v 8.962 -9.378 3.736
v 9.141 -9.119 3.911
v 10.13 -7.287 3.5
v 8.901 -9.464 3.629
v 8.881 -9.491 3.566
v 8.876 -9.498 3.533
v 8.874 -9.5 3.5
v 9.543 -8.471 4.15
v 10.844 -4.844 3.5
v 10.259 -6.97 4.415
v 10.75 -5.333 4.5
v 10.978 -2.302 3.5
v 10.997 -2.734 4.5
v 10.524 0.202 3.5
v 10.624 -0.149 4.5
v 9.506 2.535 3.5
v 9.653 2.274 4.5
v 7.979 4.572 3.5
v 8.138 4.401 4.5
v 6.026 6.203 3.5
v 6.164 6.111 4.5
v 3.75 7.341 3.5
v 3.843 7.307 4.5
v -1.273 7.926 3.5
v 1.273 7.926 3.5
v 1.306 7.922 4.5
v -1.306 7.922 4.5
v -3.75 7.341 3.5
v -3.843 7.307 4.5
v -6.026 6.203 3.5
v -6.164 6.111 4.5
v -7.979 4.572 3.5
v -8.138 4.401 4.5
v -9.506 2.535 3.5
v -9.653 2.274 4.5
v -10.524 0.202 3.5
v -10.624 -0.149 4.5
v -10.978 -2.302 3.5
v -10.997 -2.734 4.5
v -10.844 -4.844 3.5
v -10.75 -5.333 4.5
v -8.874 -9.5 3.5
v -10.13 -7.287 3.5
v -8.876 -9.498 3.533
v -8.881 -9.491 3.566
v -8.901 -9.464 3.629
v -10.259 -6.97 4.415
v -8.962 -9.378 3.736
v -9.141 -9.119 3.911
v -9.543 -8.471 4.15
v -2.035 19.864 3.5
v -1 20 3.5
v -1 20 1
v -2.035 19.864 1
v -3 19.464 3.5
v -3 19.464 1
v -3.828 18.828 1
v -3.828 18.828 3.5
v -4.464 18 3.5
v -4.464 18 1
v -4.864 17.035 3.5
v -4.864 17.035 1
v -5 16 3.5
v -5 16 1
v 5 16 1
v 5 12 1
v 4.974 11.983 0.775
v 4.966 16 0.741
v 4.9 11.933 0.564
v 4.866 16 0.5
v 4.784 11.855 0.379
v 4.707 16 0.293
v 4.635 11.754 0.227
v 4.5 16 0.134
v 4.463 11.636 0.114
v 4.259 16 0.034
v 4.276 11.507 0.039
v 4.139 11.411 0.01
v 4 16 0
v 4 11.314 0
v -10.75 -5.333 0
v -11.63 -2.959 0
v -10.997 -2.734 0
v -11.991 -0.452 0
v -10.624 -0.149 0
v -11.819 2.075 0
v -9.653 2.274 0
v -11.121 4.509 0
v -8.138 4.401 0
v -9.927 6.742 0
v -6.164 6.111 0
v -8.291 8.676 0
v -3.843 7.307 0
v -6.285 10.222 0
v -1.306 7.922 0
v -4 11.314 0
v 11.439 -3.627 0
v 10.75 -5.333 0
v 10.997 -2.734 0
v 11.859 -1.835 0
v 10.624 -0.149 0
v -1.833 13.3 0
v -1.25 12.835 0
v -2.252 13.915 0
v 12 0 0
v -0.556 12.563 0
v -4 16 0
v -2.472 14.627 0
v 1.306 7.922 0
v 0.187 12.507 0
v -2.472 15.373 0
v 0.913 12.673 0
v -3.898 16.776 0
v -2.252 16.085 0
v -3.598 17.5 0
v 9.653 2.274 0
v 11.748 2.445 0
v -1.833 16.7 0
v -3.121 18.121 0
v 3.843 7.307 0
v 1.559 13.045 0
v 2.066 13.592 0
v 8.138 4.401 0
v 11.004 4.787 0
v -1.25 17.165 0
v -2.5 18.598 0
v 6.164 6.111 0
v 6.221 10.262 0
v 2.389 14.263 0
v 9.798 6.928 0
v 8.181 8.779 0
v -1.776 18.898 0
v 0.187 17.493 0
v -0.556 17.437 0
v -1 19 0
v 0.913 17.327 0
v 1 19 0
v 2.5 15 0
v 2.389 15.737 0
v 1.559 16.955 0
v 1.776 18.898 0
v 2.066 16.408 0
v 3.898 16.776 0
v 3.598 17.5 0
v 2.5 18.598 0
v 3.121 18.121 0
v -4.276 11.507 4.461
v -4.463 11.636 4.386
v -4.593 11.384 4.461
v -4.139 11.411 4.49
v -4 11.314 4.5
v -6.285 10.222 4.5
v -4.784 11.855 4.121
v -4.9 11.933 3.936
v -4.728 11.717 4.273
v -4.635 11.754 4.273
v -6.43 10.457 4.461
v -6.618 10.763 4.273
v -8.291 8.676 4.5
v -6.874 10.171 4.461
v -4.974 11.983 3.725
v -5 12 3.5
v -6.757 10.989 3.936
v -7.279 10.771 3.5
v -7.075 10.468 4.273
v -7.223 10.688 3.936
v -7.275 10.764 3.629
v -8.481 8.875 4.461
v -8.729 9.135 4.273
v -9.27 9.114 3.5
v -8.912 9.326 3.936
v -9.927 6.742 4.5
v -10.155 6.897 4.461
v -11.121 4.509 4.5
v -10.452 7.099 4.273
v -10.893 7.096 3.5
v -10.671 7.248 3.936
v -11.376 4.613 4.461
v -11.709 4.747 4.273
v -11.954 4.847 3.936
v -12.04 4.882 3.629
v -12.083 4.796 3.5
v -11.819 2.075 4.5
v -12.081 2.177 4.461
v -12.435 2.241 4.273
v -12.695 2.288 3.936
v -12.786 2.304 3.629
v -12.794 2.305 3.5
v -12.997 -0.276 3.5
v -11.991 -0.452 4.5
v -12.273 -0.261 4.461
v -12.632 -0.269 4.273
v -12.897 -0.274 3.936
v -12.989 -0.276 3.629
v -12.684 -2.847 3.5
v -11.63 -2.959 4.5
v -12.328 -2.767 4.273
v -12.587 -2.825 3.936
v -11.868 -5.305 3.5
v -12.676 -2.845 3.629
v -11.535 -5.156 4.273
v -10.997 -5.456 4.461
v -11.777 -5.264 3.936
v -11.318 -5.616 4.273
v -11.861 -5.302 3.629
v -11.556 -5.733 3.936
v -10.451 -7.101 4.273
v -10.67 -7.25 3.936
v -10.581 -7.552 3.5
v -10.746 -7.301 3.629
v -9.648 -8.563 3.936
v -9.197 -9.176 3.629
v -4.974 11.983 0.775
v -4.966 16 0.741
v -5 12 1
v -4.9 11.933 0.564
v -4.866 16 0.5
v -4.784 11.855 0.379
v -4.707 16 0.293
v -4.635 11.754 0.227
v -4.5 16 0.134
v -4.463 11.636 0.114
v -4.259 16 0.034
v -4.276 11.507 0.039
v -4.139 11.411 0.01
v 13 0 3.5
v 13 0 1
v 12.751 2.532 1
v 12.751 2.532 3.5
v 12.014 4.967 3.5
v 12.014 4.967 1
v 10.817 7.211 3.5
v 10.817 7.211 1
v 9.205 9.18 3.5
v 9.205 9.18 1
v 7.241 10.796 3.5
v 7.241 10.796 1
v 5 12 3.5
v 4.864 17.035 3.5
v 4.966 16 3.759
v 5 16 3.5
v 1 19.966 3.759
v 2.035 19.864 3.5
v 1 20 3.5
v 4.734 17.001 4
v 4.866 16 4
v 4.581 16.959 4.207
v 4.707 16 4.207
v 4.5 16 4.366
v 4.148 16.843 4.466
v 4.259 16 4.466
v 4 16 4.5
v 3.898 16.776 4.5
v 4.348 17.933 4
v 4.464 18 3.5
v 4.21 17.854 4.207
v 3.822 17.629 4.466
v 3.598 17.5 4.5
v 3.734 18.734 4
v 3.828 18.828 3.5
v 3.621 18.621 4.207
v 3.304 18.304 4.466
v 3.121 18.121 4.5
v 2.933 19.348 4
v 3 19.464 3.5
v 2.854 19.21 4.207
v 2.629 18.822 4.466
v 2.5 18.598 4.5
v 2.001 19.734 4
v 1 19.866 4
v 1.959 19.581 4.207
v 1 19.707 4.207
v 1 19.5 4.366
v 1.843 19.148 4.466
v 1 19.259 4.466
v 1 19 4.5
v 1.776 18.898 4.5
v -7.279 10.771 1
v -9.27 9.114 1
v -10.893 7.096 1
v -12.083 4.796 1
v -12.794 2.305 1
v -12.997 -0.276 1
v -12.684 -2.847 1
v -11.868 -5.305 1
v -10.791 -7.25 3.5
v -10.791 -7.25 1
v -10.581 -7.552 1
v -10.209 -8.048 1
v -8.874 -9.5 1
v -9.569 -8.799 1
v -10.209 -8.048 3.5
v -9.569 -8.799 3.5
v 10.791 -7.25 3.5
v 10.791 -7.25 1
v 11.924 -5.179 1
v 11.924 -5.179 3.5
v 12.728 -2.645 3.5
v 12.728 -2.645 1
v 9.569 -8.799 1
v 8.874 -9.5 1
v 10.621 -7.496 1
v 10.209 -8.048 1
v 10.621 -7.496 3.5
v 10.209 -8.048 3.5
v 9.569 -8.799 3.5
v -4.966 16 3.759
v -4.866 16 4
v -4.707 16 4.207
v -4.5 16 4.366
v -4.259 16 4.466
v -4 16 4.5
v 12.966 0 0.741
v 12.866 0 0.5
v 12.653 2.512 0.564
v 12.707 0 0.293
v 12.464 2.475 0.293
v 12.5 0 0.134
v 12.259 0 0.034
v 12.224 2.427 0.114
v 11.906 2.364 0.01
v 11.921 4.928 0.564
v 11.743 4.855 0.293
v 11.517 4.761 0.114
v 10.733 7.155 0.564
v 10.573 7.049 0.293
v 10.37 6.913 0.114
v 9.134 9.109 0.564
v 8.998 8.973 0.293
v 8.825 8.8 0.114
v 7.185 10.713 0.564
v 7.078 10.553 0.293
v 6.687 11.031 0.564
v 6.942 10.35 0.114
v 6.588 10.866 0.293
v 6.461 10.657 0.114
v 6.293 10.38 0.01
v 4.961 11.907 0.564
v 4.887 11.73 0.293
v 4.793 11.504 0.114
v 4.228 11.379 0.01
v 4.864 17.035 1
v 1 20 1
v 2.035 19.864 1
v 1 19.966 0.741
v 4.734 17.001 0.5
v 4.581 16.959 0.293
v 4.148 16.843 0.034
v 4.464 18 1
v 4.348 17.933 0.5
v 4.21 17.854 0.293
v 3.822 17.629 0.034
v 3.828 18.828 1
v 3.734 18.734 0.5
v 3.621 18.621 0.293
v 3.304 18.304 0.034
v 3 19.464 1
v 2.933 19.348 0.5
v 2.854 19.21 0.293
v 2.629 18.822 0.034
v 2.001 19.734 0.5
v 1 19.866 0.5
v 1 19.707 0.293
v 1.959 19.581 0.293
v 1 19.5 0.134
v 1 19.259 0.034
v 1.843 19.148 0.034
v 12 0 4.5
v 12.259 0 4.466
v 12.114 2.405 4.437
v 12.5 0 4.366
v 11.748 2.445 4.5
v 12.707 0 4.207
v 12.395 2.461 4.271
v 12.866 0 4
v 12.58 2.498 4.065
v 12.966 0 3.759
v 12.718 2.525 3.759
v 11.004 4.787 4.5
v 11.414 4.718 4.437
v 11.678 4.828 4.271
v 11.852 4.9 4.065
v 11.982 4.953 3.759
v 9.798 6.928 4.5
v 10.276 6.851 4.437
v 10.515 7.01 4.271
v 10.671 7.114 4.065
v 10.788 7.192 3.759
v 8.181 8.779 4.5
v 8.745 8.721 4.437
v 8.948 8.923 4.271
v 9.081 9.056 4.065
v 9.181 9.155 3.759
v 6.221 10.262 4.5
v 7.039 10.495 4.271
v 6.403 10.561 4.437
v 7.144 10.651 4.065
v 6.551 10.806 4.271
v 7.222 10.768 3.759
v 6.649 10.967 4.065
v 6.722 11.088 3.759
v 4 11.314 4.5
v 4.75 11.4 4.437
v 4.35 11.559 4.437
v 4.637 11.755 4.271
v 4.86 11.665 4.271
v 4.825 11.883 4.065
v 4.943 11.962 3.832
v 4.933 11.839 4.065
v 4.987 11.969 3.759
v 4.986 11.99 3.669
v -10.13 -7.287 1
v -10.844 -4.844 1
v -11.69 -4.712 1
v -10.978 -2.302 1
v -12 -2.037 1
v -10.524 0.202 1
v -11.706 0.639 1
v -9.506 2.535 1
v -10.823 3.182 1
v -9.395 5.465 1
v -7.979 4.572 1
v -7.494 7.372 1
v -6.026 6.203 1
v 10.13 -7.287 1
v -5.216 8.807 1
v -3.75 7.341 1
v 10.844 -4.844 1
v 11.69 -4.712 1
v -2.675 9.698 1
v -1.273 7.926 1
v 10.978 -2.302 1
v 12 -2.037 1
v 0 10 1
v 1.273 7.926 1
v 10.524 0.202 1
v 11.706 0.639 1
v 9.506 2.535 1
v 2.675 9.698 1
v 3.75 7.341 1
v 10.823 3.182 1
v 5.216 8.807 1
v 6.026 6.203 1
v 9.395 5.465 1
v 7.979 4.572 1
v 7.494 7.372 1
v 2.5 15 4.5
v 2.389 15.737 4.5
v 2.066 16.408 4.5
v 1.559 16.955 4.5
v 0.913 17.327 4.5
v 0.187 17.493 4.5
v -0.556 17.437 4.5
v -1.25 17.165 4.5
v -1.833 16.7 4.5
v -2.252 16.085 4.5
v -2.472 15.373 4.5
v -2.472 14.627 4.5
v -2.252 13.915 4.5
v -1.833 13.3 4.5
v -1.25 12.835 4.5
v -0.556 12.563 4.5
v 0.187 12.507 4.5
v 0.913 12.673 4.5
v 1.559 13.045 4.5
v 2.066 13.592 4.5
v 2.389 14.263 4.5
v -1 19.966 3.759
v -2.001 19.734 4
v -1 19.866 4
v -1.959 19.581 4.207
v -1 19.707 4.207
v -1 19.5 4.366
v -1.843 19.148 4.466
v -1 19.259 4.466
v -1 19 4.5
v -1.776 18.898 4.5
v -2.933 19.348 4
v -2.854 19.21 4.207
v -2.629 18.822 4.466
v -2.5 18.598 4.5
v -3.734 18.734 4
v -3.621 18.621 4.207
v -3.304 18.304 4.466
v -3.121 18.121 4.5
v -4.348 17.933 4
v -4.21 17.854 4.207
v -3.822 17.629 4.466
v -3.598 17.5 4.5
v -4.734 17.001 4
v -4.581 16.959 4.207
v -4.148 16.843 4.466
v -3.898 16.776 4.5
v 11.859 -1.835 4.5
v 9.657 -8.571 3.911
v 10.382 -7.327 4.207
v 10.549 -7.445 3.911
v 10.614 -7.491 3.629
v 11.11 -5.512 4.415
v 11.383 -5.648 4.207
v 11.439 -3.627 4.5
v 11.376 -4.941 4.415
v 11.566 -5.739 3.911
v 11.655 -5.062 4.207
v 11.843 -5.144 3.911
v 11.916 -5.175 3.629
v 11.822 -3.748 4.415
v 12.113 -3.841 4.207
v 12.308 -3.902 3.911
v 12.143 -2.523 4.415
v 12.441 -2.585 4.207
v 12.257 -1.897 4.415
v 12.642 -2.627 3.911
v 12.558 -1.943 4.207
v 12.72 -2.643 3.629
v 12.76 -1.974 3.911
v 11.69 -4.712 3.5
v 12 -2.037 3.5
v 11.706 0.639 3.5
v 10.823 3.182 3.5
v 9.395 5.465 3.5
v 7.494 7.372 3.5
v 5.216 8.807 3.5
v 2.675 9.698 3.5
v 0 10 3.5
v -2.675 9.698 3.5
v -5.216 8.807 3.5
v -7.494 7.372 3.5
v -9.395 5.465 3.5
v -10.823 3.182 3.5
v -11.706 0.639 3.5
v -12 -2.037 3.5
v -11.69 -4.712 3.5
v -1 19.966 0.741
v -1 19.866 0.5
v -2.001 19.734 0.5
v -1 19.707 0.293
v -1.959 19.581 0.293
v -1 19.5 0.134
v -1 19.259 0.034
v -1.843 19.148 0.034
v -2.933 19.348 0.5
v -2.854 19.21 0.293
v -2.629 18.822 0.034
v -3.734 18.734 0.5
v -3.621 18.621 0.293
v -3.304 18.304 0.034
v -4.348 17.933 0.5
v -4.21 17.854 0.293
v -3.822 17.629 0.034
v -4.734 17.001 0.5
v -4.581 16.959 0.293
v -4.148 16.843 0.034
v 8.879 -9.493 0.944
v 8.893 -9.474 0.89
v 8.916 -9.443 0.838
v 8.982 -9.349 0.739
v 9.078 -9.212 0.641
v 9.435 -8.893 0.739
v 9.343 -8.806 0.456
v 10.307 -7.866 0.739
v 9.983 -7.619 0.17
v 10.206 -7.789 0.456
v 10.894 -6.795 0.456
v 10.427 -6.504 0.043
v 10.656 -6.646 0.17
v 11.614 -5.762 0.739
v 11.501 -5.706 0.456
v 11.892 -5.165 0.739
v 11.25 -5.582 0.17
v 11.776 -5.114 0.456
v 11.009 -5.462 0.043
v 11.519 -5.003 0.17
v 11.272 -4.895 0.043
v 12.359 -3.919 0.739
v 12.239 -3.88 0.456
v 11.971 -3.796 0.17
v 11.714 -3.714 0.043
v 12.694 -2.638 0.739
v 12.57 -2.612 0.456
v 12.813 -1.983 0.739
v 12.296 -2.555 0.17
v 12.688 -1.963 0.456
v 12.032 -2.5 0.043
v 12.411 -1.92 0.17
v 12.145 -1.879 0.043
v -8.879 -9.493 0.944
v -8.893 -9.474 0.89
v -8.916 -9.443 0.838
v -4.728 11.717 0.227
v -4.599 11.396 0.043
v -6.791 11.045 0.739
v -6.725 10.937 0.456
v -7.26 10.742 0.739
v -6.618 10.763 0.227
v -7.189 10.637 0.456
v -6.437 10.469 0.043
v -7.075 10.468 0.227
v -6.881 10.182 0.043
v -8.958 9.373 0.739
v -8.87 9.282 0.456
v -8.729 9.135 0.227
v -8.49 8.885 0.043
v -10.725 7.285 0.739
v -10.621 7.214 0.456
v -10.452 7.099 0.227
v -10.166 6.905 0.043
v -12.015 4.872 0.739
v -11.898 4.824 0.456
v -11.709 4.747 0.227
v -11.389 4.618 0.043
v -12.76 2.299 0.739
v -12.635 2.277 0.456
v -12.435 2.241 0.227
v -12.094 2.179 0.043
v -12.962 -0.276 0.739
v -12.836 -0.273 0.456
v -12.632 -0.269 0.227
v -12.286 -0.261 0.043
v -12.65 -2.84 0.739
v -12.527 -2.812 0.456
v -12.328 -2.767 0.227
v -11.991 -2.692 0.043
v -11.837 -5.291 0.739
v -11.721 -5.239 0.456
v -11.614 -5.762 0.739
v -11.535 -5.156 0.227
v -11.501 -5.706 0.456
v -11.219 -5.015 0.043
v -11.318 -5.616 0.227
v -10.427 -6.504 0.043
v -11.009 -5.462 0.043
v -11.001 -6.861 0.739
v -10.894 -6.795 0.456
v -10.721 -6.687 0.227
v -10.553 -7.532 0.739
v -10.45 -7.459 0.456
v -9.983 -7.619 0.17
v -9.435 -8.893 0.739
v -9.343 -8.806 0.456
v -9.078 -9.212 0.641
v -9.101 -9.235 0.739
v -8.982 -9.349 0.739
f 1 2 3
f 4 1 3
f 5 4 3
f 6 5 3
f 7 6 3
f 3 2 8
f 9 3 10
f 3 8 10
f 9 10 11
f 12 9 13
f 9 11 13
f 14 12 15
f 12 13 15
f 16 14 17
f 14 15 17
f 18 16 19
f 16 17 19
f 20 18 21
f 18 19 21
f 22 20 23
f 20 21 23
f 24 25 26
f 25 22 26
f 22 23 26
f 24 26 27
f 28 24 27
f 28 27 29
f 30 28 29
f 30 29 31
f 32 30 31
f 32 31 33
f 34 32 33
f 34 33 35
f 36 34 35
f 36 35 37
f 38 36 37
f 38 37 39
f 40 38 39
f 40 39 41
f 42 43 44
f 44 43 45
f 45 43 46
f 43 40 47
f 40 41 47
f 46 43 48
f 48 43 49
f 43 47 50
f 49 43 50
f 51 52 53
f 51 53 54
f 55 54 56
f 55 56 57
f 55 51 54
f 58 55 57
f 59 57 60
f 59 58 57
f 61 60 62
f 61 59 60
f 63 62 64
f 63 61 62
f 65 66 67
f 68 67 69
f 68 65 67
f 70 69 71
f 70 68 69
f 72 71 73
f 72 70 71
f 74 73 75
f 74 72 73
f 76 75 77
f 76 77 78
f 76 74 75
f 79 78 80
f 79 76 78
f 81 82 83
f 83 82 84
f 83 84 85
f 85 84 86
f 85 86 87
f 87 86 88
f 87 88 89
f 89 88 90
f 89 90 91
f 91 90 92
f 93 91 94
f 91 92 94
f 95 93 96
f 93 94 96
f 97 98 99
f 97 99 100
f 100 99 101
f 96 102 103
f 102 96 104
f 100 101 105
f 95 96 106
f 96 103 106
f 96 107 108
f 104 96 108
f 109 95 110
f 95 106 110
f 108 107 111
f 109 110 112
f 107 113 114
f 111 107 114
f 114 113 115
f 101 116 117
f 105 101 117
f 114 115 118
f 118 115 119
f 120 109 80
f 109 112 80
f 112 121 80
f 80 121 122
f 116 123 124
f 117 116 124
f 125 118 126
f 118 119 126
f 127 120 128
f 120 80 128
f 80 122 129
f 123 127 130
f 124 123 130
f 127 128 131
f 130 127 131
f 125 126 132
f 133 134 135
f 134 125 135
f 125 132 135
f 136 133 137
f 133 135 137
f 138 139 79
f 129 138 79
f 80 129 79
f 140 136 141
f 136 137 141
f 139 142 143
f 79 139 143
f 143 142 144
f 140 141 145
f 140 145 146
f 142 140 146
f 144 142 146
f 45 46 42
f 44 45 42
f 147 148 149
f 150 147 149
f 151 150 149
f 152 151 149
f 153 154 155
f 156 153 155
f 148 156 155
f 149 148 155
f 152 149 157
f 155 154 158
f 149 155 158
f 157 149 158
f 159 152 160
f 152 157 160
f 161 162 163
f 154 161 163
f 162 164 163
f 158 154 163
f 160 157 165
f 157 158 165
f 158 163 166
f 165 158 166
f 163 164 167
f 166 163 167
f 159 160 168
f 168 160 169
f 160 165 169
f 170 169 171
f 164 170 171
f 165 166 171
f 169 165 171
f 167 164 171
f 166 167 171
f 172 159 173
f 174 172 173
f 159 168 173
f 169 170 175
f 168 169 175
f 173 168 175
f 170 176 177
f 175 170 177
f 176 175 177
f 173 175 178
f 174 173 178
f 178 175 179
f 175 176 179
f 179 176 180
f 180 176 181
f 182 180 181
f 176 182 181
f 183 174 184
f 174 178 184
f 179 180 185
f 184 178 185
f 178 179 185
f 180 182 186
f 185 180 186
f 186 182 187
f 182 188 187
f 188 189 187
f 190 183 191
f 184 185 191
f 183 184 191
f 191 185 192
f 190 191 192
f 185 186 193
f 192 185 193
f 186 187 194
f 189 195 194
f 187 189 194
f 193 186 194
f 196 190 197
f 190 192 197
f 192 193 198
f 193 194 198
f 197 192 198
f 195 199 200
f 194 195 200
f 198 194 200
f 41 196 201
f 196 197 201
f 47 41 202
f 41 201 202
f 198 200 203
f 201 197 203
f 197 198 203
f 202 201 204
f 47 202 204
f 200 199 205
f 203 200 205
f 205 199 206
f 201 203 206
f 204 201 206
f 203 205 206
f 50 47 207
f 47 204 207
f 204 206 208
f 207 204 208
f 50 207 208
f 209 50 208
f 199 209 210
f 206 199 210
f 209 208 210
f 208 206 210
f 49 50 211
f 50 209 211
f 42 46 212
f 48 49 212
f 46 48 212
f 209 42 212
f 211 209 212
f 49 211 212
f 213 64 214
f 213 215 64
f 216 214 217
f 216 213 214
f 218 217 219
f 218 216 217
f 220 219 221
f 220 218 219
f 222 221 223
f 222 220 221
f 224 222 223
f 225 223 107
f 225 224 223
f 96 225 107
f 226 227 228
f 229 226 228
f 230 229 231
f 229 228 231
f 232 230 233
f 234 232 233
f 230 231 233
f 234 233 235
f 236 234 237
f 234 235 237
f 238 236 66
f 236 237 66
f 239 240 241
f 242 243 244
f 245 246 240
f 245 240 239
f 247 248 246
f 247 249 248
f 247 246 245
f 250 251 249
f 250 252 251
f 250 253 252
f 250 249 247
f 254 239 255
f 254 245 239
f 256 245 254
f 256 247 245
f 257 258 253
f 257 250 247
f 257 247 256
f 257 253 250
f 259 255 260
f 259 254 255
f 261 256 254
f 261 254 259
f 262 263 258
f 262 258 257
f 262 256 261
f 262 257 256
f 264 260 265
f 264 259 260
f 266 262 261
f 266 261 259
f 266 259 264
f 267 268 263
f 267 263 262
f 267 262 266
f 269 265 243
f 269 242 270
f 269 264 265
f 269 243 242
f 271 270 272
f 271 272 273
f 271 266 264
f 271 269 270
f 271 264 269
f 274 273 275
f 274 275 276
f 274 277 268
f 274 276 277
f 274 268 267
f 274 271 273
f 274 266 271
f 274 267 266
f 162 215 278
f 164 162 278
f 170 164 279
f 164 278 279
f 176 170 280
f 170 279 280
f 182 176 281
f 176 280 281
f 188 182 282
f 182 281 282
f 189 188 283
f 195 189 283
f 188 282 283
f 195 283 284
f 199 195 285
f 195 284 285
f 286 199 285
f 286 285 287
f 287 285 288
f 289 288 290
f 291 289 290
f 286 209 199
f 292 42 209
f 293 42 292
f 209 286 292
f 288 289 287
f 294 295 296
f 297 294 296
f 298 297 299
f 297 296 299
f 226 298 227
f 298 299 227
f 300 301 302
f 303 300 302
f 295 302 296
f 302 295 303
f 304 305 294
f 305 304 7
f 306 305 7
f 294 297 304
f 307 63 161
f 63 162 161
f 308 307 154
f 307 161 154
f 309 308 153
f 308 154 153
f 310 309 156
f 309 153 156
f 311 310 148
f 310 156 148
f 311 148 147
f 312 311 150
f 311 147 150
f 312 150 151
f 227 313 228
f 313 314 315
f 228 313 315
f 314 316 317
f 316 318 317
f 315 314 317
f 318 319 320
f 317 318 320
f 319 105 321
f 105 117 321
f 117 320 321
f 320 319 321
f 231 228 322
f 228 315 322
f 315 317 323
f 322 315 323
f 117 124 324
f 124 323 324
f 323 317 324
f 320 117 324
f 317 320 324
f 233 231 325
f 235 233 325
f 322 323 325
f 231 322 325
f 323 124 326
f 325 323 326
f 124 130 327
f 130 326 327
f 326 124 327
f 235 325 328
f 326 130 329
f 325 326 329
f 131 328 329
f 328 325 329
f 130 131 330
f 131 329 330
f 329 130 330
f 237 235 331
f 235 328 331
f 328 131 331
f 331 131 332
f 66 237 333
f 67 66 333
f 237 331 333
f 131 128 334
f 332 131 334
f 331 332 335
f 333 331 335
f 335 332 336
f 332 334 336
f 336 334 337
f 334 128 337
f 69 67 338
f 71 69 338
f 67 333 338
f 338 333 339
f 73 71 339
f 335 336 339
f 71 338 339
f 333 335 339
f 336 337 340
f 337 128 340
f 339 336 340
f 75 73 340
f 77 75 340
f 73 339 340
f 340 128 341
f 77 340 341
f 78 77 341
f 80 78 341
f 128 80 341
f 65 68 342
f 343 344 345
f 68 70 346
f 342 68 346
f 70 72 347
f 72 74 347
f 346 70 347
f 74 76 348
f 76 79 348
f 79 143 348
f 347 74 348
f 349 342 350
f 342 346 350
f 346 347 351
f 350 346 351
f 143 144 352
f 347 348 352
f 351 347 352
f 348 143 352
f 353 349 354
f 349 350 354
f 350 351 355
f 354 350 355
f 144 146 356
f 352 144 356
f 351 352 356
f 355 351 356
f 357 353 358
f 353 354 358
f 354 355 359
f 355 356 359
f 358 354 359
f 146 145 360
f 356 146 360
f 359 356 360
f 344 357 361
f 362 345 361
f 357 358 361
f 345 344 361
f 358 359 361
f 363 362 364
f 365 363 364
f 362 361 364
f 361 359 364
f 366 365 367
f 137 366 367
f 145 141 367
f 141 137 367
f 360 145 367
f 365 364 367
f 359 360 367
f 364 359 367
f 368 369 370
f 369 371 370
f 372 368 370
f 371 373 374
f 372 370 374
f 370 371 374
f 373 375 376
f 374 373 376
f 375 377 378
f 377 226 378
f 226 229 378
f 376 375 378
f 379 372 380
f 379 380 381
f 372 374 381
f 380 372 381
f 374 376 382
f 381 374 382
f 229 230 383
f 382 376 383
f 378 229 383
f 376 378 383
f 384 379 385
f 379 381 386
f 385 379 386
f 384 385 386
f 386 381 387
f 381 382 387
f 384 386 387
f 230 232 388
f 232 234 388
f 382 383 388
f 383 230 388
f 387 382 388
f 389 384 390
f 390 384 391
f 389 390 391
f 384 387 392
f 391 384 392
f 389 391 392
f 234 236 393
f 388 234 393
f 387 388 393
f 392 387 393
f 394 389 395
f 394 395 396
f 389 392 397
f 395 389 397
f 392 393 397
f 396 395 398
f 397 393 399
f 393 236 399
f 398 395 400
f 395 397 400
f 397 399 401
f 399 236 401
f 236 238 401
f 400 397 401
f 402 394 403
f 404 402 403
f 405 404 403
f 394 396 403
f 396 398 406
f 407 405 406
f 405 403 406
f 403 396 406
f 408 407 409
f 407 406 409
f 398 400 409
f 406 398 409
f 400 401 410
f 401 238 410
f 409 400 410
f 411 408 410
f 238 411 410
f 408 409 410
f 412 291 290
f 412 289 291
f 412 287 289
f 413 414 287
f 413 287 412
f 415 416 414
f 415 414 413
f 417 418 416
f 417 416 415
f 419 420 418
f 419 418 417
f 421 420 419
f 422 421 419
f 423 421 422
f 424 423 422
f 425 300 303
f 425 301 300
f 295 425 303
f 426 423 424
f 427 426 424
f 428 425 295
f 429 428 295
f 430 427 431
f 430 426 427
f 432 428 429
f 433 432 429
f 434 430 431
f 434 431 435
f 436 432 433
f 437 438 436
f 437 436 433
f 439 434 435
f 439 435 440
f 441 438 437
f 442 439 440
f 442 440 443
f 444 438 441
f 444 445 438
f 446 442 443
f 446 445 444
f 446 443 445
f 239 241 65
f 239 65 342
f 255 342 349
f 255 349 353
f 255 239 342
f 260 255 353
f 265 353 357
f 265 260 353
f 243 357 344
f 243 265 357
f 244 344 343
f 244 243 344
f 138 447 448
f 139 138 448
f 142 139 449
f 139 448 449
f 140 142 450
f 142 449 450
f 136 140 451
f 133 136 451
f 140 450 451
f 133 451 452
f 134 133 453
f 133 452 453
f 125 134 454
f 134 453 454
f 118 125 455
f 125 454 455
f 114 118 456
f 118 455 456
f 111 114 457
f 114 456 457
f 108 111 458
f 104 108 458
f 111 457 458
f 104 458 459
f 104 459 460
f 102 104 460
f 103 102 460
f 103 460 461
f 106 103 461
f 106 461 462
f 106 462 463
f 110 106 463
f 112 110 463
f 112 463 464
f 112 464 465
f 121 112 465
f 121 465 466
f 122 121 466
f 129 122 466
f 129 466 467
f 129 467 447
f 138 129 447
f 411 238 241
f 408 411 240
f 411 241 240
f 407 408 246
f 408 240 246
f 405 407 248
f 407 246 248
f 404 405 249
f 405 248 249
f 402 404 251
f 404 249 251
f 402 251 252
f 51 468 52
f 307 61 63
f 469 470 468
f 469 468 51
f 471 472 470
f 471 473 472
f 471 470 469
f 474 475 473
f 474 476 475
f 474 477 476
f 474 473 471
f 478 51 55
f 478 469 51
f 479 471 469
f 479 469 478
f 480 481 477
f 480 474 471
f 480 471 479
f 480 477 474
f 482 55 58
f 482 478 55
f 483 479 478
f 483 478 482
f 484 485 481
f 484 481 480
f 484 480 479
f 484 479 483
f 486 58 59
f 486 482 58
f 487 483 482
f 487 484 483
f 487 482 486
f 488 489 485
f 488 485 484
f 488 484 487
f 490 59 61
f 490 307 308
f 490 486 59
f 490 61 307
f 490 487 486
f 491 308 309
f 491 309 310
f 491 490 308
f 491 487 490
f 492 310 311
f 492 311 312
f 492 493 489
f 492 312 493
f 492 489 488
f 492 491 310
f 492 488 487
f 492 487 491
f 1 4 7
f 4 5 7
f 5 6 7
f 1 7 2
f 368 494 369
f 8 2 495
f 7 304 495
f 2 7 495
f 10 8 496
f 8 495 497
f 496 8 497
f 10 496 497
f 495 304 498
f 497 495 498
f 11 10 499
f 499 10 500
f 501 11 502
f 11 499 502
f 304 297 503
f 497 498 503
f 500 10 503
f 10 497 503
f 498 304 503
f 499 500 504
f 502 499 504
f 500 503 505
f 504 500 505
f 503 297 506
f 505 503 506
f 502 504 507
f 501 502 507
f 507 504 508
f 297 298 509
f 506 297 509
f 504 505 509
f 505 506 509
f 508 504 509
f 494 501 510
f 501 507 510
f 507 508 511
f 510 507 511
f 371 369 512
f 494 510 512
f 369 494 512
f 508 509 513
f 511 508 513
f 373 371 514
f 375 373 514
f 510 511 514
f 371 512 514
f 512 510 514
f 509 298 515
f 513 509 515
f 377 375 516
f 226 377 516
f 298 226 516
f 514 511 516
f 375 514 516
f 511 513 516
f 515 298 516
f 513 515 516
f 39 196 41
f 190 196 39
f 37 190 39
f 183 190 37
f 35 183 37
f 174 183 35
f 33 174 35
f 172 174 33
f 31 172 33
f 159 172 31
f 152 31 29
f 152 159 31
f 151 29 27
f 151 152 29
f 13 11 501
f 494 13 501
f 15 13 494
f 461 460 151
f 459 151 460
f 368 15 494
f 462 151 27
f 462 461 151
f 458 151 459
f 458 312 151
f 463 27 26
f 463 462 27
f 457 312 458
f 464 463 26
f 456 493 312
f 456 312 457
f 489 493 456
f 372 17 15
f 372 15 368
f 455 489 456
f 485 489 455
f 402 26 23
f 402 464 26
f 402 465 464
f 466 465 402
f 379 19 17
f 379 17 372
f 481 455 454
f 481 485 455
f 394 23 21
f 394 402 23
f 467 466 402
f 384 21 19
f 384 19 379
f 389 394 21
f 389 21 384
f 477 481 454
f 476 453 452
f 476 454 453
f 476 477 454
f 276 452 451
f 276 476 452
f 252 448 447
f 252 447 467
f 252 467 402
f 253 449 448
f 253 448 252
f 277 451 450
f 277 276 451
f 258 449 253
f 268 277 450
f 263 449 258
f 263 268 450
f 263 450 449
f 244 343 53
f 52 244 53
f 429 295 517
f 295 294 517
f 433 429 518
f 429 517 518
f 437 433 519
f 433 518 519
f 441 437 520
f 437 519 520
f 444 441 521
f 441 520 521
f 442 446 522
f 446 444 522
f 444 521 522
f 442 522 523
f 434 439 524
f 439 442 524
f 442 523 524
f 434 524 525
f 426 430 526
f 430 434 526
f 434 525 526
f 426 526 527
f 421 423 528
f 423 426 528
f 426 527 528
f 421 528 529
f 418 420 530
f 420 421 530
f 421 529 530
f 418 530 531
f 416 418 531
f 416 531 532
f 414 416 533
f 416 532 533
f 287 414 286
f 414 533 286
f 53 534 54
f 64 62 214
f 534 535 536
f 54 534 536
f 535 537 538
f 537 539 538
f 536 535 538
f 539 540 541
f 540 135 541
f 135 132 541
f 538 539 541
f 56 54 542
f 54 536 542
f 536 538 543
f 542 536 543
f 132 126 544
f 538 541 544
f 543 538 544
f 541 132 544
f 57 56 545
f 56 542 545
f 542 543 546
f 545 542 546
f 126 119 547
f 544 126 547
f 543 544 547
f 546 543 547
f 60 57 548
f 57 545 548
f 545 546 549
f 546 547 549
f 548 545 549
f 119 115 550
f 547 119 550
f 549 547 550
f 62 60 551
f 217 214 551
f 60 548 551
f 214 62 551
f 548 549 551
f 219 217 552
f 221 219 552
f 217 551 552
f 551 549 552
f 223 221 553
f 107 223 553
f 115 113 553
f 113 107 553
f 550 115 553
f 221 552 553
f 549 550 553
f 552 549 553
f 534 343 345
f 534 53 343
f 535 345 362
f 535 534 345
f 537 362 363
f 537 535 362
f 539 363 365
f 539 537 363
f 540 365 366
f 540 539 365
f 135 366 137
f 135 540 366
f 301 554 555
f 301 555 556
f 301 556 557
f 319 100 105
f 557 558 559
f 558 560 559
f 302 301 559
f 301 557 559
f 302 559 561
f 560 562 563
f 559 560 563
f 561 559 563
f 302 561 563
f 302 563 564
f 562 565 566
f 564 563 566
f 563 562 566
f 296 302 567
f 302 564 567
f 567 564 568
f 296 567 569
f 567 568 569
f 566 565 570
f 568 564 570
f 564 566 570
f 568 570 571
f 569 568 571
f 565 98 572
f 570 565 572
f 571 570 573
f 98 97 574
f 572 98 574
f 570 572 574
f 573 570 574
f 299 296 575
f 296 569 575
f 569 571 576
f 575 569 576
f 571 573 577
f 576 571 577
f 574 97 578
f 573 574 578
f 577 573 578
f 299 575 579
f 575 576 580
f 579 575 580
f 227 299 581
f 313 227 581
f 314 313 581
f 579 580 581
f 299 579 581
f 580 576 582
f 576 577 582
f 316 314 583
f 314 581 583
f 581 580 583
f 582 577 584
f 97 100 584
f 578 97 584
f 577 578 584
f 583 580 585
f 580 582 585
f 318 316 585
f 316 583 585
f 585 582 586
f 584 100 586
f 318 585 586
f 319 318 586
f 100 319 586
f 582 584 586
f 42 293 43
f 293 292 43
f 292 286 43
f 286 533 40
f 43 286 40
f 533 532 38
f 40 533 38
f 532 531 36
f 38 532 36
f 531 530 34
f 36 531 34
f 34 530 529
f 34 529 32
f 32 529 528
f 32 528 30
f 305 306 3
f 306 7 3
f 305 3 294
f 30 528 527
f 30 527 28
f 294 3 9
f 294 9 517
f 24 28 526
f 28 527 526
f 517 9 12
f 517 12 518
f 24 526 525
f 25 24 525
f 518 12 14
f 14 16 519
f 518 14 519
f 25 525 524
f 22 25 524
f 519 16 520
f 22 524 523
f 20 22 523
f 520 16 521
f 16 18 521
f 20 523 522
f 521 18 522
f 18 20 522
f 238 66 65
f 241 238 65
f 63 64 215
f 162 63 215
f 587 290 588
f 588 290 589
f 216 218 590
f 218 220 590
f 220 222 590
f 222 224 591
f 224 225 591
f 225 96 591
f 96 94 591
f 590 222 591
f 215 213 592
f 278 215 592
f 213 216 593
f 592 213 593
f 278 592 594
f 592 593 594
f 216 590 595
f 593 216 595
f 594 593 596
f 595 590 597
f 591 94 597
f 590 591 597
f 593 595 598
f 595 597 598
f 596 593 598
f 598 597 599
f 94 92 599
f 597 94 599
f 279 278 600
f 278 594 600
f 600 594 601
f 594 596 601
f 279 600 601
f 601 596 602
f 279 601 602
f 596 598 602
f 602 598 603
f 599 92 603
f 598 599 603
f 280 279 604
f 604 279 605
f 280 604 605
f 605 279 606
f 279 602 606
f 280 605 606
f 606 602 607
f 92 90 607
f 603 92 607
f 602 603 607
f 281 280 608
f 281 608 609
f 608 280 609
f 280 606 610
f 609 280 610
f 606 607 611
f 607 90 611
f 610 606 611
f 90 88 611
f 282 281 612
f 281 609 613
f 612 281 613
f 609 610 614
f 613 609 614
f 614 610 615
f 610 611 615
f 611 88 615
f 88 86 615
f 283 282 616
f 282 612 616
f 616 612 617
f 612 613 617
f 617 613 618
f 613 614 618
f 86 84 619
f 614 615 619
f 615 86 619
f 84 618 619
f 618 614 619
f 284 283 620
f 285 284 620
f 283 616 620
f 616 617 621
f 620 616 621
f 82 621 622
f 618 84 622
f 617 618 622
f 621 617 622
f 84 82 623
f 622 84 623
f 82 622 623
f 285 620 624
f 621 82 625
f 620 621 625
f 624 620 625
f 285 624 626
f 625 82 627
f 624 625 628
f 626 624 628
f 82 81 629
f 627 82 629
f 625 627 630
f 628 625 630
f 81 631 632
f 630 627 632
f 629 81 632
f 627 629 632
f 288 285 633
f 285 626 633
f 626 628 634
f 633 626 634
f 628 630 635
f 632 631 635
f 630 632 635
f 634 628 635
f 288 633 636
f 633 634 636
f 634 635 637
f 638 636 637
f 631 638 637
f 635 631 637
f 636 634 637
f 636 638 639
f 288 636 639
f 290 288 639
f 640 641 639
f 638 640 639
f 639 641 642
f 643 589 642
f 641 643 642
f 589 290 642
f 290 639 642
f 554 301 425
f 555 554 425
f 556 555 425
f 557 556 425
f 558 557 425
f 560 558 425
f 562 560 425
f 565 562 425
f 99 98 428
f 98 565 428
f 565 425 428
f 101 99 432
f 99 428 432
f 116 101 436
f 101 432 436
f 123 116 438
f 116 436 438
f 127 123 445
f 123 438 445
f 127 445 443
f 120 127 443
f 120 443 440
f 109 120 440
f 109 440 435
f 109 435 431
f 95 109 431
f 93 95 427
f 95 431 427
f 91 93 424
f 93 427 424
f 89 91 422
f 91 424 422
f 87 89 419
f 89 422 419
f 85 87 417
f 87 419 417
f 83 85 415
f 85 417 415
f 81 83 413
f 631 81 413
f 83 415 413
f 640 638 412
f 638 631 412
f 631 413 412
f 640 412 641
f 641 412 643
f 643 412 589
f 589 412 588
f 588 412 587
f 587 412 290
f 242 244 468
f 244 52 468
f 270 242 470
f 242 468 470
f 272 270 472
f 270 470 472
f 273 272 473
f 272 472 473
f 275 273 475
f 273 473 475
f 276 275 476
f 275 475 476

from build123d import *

# Parameters (mm, degrees)
F1_DEPTH  = 4.5
F2_R      = 4
F3_R      = 2.5
F4_DEPTH  = 4.501
F5_R      = 11
F6_DEPTH  = 1
F7_R      = 12
F8_DEPTH  = 2.5
F9_R      = 11
F10_DEPTH = 1.001
F11_R     = 0.99999


# Not quite as in the source:
# - a fillet or chamfer is up to 0.001 mm smaller than in the source, because OpenCascade refuses the exact size


with BuildPart() as f1:
    # F0 (on Top) → F1 (new body)
    with BuildSketch(Plane.XY):
        with BuildLine():
            ThreePointArc((-5, 12), (-7.2111025509, -10.8166538264), (13, 0))
            ThreePointArc((13, 0), (10.8166538264, 7.2111025509), (5, 12))
            Line((5, 12), (-5, 12))
        make_face()
        with BuildLine():
            Line((-5, 12), (5, 12))
            ThreePointArc((5, 12), (0, 13), (-5, 12))
        make_face()
        with BuildLine():
            ThreePointArc((-5, 12), (0, 13), (5, 12))
            Line((5, 12), (5, 20))
            Line((5, 20), (-5, 20))
            Line((-5, 20), (-5, 12))
        make_face()
    extrude(amount=F1_DEPTH)

    # F2
    f2_edges = [f1.edges().sort_by_distance(p)[0] for p in [
        (5, 20, 2.25),
        (-5, 20, 2.25),
    ]]
    fillet(f2_edges, radius=F2_R)

    # F3 (on face) → F4 (cut, through all)
    with BuildSketch(Plane.XY.offset(4.5)):
        with Locations((0, 15)):
            Circle(F3_R)
    extrude(amount=-F4_DEPTH, mode=Mode.SUBTRACT)

    # F5 (on face) → F6 (cut)
    with BuildSketch(Plane.XY.offset(4.5)):
        with Locations((0, -3)):
            Circle(F5_R)
    extrude(amount=-F6_DEPTH, mode=Mode.SUBTRACT)

    # F7 (on face) → F8 (cut)
    with BuildSketch(Plane.XY.offset(3.5)):
        with Locations((0, -2)):
            Circle(F7_R)
    extrude(amount=-F8_DEPTH, mode=Mode.SUBTRACT)

    # F9 (on face) → F10 (cut, through all)
    with BuildSketch(Plane.XY.offset(1)):
        with Locations((0, -3)):
            Circle(F9_R)
    extrude(amount=-F10_DEPTH, mode=Mode.SUBTRACT)

    # F11 (radius 1 in the source; OpenCascade refuses exactly that, so slightly less here)
    f11_edges = [f1.edges().sort_by_distance(p)[0] for p in [
        (12.793956, 2.305363, 4.5),
        (5, 14, 4.5),
        (-12.793956, 2.305363, 4.5),
        (12.793956, 2.305363, 0),
        (-12.793956, 2.305363, 0),
        (-3.828427, 18.828427, 0),
    ]]
    fillet(f11_edges, radius=F11_R)


solid = f1.part
